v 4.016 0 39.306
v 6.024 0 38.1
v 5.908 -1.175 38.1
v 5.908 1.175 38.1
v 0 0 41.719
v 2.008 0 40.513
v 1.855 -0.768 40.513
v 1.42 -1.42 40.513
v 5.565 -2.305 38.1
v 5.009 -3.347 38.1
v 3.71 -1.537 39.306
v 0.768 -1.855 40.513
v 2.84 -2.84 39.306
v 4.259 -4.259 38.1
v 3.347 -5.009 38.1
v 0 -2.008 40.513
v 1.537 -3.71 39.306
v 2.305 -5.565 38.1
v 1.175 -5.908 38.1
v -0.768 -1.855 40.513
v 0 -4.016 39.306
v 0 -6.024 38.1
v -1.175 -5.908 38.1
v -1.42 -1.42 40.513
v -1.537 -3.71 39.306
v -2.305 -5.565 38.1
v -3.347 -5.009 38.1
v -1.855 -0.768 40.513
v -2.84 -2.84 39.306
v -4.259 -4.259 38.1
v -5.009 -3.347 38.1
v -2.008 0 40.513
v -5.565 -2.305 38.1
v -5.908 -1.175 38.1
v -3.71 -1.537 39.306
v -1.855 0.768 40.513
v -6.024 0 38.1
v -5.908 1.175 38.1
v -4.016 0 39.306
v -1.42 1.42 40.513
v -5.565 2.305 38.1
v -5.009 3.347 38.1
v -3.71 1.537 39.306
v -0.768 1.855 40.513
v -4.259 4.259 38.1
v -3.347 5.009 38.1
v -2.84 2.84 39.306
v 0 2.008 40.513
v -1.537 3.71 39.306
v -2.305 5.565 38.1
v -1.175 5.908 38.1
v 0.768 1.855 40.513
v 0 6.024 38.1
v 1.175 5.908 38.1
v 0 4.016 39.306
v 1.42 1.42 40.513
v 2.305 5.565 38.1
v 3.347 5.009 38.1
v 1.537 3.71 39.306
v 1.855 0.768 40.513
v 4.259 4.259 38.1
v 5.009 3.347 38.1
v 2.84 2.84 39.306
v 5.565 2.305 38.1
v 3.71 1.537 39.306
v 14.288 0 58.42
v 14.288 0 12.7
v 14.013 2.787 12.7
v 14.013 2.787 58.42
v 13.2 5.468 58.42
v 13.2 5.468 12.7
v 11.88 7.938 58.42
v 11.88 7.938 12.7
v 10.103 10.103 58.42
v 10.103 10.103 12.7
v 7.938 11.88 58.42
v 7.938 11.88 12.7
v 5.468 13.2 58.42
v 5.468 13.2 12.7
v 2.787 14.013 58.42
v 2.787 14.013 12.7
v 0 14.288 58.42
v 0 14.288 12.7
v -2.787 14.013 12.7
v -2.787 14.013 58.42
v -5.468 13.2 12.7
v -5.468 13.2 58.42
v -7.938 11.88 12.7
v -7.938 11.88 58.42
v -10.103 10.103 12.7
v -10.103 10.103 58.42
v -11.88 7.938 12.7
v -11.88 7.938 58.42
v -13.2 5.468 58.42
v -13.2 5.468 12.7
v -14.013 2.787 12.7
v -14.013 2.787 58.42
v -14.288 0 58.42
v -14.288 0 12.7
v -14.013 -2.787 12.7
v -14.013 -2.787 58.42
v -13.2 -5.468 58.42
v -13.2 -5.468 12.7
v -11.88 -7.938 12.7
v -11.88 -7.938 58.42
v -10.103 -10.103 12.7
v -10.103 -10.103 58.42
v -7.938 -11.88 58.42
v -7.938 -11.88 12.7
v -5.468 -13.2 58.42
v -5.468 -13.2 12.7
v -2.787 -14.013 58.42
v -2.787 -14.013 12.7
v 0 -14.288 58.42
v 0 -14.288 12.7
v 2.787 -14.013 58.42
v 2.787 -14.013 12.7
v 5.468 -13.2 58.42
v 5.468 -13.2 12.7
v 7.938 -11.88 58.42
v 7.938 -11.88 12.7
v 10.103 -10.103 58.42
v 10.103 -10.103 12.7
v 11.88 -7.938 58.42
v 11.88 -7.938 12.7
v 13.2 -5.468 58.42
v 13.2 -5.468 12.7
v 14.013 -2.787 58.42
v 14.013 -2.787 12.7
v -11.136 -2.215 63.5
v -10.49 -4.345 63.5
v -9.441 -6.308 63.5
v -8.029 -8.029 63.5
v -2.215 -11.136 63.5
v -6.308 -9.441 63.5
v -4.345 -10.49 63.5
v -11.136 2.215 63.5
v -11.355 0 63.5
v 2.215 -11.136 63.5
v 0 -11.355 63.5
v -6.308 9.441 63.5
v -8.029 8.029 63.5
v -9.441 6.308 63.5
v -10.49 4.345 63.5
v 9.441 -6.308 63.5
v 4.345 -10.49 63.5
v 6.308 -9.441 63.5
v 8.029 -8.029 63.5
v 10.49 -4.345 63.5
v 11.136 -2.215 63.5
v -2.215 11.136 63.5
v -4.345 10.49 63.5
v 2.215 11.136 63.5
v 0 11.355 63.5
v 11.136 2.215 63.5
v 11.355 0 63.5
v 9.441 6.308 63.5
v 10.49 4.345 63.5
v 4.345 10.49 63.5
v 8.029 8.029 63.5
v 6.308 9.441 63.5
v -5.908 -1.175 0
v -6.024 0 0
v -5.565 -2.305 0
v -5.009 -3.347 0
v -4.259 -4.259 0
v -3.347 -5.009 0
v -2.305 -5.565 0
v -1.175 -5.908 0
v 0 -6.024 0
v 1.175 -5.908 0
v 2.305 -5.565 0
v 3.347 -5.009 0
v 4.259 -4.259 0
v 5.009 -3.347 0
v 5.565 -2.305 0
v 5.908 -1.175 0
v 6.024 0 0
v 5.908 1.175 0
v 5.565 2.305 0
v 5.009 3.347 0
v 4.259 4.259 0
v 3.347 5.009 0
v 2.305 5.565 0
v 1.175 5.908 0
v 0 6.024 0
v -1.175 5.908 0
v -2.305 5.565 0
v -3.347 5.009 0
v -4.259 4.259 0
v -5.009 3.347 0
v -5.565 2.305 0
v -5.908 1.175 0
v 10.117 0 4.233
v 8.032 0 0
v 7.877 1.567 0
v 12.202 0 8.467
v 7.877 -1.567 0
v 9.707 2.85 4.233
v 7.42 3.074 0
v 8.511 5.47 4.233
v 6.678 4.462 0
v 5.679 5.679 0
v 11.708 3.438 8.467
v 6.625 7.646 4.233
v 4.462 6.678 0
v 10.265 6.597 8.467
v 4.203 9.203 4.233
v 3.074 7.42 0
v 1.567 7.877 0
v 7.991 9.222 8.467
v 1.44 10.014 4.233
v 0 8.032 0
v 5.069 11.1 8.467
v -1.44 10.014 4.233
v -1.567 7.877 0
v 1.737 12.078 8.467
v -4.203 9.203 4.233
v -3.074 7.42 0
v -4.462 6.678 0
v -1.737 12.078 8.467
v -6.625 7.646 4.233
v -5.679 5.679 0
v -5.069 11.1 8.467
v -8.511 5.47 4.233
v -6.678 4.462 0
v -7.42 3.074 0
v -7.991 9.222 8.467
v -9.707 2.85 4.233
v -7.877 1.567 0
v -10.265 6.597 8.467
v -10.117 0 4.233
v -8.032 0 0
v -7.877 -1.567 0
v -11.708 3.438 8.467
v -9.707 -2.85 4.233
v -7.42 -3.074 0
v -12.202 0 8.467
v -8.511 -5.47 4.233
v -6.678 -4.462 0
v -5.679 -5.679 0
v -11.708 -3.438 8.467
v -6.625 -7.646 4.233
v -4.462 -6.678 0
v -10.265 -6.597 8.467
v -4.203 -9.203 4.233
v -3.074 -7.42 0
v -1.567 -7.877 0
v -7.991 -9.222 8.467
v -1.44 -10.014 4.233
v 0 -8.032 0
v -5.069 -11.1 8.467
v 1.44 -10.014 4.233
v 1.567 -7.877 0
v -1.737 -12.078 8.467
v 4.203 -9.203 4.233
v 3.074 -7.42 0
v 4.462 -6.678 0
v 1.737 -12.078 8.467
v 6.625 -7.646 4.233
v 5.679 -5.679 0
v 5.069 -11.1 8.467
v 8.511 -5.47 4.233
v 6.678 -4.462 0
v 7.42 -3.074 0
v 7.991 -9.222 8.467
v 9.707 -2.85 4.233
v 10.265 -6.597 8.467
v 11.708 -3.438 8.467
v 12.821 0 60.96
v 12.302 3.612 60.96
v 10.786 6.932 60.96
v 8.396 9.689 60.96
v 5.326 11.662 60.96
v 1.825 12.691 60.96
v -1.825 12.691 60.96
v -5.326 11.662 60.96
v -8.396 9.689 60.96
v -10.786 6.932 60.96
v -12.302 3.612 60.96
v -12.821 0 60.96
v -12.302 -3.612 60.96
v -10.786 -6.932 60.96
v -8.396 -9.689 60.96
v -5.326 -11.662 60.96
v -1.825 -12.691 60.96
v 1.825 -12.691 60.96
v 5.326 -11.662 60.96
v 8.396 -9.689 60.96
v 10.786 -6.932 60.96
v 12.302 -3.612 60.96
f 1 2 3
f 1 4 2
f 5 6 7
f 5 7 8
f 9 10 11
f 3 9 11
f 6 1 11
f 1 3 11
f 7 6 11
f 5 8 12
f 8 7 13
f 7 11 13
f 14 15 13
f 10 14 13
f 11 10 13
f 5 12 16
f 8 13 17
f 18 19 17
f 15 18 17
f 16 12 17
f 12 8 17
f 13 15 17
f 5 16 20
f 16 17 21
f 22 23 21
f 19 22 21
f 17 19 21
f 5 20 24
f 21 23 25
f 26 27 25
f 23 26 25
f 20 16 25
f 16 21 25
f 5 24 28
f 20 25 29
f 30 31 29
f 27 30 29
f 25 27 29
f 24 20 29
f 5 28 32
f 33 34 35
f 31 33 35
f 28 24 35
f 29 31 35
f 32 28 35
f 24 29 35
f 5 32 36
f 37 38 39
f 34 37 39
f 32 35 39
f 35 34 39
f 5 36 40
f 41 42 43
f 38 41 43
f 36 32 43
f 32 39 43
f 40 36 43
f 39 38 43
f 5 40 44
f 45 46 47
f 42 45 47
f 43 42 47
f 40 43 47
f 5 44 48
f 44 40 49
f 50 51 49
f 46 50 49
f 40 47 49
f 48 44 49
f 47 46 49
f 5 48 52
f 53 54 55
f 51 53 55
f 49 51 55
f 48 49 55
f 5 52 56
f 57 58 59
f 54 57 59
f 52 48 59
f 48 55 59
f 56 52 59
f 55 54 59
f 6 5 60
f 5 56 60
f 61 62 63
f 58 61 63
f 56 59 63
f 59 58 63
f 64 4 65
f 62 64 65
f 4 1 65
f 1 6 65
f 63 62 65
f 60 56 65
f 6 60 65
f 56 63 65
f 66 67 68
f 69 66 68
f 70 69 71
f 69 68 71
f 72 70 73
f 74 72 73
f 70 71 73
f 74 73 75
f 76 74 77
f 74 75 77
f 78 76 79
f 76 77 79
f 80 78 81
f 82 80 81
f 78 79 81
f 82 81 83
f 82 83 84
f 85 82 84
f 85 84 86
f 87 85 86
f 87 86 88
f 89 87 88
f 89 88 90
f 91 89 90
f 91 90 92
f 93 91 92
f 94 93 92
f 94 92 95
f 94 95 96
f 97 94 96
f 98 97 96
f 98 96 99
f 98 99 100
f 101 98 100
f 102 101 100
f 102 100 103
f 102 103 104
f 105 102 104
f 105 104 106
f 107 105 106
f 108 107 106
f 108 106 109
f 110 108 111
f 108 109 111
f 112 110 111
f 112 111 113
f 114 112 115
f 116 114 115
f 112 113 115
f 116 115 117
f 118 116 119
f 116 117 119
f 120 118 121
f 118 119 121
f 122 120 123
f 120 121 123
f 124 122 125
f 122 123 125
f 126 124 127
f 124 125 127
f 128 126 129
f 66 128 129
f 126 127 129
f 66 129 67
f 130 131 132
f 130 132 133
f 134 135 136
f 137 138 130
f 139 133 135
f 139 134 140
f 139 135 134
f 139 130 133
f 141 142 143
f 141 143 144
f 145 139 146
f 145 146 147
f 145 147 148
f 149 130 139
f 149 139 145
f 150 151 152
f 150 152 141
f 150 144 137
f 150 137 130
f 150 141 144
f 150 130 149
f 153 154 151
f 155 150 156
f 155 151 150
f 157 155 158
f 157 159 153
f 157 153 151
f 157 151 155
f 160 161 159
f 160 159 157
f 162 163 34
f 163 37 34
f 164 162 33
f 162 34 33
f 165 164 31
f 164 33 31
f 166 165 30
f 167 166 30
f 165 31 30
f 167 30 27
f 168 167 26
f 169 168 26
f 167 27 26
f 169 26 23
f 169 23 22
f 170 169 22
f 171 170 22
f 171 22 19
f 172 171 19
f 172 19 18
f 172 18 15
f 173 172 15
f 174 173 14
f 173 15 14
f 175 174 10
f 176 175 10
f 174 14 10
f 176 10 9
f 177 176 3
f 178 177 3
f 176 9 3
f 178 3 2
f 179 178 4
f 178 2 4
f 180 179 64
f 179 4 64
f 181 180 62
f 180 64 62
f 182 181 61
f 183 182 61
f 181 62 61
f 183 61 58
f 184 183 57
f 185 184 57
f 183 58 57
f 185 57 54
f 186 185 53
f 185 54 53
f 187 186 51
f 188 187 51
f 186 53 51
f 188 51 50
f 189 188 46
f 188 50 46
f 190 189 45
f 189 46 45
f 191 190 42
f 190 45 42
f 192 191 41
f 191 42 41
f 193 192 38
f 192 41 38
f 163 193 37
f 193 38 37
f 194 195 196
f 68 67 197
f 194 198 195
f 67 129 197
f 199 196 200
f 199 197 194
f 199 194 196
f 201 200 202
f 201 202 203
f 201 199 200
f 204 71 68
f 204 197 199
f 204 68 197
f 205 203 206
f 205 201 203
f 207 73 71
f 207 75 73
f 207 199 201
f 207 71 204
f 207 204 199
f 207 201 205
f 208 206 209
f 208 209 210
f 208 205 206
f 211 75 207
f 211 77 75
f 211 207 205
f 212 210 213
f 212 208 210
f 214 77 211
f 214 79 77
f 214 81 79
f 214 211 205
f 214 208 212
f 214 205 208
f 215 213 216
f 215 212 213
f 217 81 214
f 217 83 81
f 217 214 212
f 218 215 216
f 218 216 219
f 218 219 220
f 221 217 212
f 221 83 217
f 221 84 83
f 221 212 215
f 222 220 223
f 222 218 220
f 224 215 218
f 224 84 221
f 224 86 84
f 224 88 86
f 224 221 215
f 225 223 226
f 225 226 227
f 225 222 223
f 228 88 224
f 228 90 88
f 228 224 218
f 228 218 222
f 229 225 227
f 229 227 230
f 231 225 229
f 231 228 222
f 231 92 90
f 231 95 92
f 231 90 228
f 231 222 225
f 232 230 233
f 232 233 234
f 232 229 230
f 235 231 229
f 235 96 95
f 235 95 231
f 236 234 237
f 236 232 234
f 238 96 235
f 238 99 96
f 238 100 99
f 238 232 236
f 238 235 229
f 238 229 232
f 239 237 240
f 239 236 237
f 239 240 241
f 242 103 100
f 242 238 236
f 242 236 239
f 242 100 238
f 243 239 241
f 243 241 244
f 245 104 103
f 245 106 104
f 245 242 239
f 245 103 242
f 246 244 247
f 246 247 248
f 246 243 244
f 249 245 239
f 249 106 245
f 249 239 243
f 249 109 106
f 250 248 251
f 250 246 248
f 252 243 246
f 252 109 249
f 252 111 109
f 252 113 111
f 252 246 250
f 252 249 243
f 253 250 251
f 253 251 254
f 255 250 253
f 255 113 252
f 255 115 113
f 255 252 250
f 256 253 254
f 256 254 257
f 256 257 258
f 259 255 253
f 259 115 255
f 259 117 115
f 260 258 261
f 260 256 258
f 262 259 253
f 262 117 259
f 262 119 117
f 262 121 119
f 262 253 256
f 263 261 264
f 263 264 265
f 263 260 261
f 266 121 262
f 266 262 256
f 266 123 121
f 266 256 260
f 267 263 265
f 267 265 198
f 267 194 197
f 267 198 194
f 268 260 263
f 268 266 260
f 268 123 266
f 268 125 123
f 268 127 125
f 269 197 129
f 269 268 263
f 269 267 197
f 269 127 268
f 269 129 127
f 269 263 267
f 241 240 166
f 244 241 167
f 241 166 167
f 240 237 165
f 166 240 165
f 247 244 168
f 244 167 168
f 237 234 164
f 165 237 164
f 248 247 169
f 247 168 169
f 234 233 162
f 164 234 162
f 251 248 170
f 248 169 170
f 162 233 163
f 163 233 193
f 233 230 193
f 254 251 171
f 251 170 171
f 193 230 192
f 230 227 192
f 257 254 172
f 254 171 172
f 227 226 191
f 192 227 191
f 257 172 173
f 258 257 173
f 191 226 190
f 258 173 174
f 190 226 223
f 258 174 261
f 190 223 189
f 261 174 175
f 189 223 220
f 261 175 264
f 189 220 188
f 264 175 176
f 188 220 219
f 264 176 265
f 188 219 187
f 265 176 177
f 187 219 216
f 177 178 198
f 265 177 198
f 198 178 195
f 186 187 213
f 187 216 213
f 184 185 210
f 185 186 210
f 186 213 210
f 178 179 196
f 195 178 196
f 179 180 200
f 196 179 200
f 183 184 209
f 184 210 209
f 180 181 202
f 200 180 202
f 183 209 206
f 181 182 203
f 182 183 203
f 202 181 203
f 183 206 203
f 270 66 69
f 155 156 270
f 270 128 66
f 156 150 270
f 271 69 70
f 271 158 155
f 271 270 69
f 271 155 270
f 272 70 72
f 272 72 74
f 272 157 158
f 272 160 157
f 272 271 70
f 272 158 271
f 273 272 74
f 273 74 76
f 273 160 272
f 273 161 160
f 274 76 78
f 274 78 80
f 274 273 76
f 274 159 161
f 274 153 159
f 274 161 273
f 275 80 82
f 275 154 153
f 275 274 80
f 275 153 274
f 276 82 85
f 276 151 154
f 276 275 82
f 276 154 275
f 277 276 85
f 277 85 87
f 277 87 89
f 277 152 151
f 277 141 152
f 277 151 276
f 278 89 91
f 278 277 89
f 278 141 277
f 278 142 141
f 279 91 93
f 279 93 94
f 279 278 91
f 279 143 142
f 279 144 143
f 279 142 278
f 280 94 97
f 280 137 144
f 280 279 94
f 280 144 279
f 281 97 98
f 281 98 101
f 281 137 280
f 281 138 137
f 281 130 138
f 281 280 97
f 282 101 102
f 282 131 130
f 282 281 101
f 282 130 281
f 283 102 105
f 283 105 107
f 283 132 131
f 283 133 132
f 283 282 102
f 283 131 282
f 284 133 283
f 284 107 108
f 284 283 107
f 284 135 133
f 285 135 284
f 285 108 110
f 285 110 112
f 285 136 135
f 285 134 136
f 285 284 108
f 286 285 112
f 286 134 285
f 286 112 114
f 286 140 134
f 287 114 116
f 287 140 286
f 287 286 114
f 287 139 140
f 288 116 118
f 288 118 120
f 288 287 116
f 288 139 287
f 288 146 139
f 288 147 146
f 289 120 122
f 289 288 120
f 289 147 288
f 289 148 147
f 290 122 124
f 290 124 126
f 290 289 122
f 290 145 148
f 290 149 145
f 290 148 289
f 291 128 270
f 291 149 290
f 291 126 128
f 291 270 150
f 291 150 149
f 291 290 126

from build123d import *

# Parameters (mm, degrees)
F0_R     = 8.0316205534
F2_R     = 14.2875
F4_R     = 14.2875
F8_D     = 12.04743083
F8_DEPTH = 38.1
F8_TIP   = 3.6194133731
F9_SIZE2 = 2.9329393675
F9_SIZE  = 5.08


with BuildPart() as f5:
    # F0 (on Top) → F5 section 0
    with BuildSketch(Plane.XY):
        Circle(F0_R)
    # F2 (on offset) → F5 section 1
    with BuildSketch(Plane.XY.offset(12.7)):
        Circle(F2_R)
    loft()

    # F4 (on offset) → F6 section 0
    with BuildSketch(Plane.XY.offset(63.5)):
        Circle(F4_R)
    # F2 (on offset) → F6 section 1
    with BuildSketch(Plane.XY.offset(12.7)):
        Circle(F2_R)
    loft()

    # F8
    with Locations(Plane(origin=(0, 0, 0), x_dir=(1, 0, 0), z_dir=(0, 0, -1))):
        with Locations((0, 0)):
            Hole(F8_D / 2, depth=F8_DEPTH)
            with Locations((0, 0, -(F8_DEPTH + F8_TIP / 2))):  # 118° drill point
                Cone(0, F8_D / 2, F8_TIP, mode=Mode.SUBTRACT)

    # F9
    f9_edges = [f5.edges().sort_by_distance(p)[0] for p in [
        (-14.2875, 0, 63.5),
    ]]
    chamfer(f9_edges, length=F9_SIZE, length2=F9_SIZE2)


solid = f5.part
